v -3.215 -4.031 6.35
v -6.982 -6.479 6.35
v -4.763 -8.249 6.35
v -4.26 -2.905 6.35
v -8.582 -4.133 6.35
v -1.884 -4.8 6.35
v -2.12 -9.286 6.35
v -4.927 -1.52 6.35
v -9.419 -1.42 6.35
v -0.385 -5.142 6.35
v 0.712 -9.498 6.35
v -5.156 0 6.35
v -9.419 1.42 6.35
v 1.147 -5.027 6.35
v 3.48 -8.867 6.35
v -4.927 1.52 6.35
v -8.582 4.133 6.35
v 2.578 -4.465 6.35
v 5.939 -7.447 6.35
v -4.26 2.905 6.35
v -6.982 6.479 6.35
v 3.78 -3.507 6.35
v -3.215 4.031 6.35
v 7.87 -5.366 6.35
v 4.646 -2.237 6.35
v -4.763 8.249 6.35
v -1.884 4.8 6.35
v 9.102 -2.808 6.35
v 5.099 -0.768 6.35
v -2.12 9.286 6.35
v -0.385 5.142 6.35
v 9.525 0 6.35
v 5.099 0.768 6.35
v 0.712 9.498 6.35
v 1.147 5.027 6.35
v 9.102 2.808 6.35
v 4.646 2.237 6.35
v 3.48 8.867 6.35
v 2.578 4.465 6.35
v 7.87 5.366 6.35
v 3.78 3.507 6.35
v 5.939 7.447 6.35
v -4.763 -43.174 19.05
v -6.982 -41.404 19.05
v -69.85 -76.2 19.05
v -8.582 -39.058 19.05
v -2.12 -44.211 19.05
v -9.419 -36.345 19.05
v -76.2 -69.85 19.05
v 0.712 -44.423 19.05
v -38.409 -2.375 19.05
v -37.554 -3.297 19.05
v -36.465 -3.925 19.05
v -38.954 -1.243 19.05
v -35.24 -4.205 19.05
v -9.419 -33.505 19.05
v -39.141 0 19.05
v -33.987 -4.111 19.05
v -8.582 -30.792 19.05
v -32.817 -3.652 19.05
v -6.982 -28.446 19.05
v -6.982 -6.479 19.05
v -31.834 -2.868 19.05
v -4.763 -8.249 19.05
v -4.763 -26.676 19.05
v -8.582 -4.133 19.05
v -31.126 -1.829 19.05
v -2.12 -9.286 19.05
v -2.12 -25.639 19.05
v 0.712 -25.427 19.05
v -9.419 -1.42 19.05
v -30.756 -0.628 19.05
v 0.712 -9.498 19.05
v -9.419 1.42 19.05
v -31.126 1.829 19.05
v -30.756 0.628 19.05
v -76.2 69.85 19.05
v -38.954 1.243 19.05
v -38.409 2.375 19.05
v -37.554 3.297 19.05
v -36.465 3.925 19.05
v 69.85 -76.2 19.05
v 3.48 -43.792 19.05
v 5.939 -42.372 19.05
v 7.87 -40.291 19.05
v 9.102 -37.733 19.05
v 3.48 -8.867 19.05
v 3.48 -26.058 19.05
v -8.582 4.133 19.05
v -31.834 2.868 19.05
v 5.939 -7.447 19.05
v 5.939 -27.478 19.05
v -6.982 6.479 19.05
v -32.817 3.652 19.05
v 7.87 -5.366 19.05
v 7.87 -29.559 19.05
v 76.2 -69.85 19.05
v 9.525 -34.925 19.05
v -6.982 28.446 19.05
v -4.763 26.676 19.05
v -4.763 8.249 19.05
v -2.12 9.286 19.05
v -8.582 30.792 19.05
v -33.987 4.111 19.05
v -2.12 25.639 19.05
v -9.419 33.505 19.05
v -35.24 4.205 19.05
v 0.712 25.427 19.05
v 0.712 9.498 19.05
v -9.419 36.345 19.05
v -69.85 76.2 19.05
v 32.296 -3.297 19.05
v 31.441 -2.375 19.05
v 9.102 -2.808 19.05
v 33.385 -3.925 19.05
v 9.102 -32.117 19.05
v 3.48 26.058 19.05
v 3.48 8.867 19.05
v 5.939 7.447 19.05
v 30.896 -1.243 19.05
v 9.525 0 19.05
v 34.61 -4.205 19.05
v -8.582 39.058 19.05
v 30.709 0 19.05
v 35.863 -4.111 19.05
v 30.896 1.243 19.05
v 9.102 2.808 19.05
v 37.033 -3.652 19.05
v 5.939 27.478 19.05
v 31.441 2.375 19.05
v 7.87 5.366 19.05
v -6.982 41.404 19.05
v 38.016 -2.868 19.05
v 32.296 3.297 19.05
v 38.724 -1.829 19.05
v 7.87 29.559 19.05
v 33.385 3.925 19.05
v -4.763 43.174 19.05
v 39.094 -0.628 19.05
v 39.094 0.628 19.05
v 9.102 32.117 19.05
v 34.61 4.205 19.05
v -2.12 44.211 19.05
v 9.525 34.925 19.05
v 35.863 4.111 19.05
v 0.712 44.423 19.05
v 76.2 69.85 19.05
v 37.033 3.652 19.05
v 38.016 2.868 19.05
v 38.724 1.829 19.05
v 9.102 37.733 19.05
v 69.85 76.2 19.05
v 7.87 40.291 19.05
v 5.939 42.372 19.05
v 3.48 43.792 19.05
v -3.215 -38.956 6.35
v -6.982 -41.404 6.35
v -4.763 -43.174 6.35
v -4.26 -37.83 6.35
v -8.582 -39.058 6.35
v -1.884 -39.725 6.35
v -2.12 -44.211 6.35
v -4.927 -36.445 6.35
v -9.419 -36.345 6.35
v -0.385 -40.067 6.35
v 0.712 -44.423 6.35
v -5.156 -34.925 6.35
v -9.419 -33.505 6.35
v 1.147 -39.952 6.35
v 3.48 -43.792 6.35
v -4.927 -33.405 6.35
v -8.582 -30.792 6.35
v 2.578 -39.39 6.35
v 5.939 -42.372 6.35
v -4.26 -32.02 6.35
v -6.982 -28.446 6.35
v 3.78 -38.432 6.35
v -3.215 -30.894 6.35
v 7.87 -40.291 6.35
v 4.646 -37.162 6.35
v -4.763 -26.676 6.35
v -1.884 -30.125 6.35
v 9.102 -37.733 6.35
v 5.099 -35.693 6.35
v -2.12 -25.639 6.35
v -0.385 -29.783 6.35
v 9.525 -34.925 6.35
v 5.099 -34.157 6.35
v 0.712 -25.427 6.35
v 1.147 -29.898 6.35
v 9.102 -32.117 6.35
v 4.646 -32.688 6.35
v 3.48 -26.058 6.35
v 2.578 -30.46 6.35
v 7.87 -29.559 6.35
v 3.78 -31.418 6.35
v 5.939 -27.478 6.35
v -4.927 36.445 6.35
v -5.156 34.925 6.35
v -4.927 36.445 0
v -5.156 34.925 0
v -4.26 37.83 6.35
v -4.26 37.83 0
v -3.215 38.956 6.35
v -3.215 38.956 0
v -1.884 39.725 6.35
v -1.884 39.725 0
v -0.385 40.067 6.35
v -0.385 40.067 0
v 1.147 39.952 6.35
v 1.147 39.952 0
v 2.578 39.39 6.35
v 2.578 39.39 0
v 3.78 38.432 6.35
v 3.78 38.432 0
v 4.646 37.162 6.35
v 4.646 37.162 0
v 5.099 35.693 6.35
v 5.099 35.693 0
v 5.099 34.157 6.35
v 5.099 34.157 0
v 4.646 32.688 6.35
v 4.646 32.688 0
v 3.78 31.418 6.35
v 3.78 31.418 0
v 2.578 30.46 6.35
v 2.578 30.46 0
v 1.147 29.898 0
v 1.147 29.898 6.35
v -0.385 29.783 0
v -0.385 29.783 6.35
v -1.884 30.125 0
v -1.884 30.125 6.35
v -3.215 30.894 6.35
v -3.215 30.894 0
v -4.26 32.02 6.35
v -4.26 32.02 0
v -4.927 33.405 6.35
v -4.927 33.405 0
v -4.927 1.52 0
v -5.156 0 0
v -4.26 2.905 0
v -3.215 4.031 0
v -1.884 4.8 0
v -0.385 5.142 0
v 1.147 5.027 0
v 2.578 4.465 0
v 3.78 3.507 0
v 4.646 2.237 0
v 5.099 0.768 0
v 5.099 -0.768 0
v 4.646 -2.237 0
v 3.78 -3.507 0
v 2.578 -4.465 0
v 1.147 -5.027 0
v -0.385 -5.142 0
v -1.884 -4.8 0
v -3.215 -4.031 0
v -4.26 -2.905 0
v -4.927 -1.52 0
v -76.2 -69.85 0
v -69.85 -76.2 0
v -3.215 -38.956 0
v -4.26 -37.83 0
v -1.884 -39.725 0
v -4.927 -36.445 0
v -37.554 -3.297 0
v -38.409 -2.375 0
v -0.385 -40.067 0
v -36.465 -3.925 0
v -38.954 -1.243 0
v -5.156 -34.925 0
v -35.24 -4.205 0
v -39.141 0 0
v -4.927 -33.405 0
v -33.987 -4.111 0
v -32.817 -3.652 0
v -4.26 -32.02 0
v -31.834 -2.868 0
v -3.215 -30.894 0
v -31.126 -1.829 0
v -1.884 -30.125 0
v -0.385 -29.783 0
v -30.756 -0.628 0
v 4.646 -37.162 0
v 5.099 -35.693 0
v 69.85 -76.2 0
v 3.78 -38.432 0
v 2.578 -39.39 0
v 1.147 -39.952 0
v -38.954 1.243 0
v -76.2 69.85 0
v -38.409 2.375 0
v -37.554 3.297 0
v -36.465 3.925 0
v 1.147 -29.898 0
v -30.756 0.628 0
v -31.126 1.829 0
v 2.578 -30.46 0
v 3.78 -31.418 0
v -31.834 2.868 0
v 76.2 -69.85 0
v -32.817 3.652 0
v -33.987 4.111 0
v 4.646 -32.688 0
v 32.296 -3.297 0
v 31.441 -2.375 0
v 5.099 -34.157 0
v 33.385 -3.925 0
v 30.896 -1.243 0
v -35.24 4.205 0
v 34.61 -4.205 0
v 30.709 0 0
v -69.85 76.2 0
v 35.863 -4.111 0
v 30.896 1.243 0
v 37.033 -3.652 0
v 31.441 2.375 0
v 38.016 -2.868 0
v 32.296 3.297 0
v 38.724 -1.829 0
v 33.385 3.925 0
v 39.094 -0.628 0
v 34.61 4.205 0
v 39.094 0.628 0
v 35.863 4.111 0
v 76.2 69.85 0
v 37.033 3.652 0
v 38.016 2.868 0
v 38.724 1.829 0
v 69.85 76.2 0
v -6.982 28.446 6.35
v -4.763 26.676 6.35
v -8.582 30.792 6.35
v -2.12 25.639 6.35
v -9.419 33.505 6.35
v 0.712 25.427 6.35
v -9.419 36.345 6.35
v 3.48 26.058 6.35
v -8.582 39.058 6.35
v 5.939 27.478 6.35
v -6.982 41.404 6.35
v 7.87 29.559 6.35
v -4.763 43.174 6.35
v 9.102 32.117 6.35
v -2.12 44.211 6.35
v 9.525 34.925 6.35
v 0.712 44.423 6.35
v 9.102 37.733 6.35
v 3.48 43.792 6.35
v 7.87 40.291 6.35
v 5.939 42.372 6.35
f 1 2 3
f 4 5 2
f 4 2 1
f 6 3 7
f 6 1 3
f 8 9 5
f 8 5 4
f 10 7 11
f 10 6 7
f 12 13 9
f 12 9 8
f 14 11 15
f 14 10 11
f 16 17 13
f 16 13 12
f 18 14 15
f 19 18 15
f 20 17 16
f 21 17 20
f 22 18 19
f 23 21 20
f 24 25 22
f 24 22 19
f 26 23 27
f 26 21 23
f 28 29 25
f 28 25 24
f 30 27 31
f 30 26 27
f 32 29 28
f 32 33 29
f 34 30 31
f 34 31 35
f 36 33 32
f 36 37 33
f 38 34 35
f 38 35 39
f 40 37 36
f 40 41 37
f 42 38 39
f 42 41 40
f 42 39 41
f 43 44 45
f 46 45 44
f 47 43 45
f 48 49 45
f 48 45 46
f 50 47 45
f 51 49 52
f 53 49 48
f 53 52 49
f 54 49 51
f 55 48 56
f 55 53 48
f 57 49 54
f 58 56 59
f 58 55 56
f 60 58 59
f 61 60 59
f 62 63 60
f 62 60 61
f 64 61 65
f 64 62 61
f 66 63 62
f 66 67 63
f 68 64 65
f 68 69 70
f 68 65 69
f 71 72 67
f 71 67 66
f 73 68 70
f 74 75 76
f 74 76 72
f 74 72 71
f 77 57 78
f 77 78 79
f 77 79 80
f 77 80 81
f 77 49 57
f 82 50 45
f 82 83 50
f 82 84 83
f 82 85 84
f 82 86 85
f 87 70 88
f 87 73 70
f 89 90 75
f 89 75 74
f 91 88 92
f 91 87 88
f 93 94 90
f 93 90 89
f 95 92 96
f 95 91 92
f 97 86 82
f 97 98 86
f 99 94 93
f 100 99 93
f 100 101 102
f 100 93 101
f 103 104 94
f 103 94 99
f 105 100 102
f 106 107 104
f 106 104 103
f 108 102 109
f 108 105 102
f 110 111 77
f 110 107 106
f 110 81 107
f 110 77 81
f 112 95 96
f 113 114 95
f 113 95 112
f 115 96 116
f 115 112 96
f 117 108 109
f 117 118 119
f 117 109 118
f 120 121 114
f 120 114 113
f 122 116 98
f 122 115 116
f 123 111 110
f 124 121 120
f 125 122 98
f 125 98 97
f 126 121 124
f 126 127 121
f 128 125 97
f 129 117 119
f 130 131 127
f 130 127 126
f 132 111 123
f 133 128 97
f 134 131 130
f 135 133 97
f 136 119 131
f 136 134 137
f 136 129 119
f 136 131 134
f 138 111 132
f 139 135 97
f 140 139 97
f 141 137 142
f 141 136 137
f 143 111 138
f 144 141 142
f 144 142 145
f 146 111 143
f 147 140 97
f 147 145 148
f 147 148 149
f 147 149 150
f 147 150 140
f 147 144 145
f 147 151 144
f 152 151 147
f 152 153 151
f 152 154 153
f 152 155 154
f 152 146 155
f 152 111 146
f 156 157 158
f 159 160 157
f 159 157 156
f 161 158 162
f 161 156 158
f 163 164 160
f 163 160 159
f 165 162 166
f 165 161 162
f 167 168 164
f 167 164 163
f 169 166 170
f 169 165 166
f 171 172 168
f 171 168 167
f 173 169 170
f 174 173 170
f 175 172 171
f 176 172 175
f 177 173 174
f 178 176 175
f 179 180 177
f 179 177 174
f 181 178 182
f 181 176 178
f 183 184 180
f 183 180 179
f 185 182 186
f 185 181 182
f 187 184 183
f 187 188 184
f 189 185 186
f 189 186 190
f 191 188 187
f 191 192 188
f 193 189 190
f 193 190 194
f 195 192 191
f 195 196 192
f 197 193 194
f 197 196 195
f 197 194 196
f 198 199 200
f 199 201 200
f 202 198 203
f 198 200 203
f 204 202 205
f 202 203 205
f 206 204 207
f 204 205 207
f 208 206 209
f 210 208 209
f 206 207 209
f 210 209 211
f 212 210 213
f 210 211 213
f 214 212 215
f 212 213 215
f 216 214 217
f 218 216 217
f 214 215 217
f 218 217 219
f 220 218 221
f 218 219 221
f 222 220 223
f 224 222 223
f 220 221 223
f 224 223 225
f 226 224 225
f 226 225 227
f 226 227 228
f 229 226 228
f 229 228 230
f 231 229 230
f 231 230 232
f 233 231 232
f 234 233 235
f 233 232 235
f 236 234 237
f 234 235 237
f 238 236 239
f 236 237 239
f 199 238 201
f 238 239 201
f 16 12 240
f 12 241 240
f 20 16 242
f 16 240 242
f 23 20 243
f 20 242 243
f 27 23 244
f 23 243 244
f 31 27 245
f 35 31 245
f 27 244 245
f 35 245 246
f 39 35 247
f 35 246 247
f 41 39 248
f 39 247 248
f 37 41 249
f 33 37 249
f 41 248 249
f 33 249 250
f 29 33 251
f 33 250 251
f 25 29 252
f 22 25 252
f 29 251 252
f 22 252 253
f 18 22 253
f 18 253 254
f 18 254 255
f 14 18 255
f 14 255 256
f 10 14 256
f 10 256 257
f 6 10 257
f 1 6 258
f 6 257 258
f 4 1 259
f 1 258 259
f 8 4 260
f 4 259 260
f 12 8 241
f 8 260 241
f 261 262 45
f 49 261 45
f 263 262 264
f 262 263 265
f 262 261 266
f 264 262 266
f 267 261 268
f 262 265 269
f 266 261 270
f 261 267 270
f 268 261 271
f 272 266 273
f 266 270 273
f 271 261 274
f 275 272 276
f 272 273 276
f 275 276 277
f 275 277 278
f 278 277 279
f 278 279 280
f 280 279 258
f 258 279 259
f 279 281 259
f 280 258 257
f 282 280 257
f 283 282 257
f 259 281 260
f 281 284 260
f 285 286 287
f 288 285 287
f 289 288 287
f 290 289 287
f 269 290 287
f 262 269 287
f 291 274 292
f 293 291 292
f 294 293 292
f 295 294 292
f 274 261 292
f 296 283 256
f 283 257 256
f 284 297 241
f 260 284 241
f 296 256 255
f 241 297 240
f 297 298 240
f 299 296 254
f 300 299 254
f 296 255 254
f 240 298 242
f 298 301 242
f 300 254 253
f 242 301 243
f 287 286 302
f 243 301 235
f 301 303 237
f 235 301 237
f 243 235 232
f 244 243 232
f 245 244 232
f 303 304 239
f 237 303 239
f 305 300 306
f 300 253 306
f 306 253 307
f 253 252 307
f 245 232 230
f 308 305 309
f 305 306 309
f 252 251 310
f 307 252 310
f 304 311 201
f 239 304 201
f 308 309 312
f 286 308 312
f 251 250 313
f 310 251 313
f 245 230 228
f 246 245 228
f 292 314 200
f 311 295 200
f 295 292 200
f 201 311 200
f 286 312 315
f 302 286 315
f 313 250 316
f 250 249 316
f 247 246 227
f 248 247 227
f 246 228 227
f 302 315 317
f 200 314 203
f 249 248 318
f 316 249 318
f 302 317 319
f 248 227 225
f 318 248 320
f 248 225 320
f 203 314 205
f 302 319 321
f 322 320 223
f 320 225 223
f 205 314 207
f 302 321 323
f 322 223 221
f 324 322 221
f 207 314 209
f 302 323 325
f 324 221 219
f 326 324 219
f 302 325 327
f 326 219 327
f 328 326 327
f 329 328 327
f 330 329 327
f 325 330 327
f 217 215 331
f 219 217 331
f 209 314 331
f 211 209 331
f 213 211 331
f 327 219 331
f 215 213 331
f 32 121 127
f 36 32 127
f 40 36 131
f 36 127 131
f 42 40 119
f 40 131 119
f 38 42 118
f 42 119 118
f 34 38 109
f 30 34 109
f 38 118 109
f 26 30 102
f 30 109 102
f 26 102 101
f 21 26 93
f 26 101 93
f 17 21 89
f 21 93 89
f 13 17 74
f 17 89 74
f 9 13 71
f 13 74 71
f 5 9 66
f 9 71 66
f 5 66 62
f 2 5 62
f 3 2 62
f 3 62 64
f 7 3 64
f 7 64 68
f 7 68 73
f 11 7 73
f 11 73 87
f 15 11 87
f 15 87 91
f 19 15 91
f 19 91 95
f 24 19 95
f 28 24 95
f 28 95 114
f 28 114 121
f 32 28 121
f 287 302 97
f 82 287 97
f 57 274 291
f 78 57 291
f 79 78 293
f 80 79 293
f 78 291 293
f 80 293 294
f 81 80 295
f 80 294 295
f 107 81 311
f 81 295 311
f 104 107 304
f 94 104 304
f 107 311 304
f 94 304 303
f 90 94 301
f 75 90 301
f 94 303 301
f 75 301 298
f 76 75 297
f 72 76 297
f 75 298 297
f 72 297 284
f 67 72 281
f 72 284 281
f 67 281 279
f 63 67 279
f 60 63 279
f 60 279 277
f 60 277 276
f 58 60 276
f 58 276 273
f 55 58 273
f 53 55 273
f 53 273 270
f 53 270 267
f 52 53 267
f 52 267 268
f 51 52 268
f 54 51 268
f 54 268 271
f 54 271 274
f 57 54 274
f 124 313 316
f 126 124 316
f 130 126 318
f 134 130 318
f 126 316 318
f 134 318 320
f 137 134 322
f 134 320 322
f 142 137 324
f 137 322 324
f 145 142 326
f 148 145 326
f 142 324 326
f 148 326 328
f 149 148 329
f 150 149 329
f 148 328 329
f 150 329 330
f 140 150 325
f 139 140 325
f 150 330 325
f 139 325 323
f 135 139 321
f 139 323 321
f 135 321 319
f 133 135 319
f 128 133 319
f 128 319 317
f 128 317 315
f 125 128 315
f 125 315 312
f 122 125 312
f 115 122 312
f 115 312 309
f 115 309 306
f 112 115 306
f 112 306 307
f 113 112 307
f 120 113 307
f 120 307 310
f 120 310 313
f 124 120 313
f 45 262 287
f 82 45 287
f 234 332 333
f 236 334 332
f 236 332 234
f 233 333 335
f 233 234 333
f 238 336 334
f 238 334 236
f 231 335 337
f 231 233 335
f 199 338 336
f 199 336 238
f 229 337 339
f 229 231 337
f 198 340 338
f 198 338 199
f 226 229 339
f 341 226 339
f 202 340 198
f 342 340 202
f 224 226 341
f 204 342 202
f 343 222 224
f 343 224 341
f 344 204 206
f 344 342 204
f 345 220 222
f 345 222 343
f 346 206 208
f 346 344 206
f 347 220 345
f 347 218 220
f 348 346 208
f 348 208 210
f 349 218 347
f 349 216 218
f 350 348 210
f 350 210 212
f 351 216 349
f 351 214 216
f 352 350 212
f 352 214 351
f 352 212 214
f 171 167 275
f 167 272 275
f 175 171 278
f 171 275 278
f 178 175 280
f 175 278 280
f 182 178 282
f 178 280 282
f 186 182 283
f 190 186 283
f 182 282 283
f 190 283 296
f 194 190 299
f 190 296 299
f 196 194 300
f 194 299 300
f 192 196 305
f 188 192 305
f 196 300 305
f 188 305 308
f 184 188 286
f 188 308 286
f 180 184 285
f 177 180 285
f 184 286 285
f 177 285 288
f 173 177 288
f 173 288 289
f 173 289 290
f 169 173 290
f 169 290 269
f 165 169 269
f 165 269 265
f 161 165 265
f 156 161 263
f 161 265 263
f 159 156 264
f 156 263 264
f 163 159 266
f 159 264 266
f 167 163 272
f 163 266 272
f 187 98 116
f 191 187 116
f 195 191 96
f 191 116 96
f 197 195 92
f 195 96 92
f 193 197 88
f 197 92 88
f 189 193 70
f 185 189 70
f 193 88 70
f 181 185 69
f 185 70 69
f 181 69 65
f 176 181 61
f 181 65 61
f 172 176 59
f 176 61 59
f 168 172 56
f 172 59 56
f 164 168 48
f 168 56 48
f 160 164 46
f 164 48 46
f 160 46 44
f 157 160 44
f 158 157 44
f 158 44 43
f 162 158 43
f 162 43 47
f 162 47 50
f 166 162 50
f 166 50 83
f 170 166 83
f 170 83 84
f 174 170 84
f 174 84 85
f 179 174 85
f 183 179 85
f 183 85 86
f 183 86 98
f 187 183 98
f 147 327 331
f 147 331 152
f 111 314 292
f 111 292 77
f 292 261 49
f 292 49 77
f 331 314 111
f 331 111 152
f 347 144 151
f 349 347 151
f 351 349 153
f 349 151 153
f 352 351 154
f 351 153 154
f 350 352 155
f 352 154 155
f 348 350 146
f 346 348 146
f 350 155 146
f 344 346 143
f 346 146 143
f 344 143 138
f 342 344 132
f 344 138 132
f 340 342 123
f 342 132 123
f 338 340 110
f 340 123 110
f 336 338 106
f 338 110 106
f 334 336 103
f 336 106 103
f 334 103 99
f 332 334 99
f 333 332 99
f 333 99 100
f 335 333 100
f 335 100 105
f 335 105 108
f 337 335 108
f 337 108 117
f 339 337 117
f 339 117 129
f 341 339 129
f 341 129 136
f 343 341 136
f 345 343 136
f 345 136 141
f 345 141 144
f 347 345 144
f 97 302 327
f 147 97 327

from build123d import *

# Parameters (mm, degrees)
F0_W           = 152.4
F0_H           = 152.4
F1_DEPTH       = 19.05
F3_D           = 8.4328
F4_D           = 10.3124
F4_CBORE_D     = 19.05
F4_CBORE_DEPTH = 12.7
F5_SIZE        = 6.35


with BuildPart() as f1:
    # F0 (on Top) → F1 (new body)
    with BuildSketch(Plane.XY):
        Rectangle(F0_W, F0_H)
    extrude(amount=F1_DEPTH)

    # F3 (through all)
    with Locations(Plane.XY.offset(19.05)):
        with Locations((-34.925, 0), (34.925, 0)):
            Hole(F3_D / 2)

    # F4 (through all)
    with Locations(Plane.XY.offset(19.05)):
        with Locations((0, 34.925), (0, 0), (0, -34.925)):
            CounterBoreHole(F4_D / 2, F4_CBORE_D / 2, F4_CBORE_DEPTH)

    # F5
    f5_edges = [f1.edges().sort_by_distance(p)[0] for p in [
        (-76.2, 76.2, 9.525),
        (-76.2, -76.2, 9.525),
        (76.2, -76.2, 9.525),
        (76.2, 76.2, 9.525),
    ]]
    chamfer(f5_edges, length=F5_SIZE)


solid = f1.part
